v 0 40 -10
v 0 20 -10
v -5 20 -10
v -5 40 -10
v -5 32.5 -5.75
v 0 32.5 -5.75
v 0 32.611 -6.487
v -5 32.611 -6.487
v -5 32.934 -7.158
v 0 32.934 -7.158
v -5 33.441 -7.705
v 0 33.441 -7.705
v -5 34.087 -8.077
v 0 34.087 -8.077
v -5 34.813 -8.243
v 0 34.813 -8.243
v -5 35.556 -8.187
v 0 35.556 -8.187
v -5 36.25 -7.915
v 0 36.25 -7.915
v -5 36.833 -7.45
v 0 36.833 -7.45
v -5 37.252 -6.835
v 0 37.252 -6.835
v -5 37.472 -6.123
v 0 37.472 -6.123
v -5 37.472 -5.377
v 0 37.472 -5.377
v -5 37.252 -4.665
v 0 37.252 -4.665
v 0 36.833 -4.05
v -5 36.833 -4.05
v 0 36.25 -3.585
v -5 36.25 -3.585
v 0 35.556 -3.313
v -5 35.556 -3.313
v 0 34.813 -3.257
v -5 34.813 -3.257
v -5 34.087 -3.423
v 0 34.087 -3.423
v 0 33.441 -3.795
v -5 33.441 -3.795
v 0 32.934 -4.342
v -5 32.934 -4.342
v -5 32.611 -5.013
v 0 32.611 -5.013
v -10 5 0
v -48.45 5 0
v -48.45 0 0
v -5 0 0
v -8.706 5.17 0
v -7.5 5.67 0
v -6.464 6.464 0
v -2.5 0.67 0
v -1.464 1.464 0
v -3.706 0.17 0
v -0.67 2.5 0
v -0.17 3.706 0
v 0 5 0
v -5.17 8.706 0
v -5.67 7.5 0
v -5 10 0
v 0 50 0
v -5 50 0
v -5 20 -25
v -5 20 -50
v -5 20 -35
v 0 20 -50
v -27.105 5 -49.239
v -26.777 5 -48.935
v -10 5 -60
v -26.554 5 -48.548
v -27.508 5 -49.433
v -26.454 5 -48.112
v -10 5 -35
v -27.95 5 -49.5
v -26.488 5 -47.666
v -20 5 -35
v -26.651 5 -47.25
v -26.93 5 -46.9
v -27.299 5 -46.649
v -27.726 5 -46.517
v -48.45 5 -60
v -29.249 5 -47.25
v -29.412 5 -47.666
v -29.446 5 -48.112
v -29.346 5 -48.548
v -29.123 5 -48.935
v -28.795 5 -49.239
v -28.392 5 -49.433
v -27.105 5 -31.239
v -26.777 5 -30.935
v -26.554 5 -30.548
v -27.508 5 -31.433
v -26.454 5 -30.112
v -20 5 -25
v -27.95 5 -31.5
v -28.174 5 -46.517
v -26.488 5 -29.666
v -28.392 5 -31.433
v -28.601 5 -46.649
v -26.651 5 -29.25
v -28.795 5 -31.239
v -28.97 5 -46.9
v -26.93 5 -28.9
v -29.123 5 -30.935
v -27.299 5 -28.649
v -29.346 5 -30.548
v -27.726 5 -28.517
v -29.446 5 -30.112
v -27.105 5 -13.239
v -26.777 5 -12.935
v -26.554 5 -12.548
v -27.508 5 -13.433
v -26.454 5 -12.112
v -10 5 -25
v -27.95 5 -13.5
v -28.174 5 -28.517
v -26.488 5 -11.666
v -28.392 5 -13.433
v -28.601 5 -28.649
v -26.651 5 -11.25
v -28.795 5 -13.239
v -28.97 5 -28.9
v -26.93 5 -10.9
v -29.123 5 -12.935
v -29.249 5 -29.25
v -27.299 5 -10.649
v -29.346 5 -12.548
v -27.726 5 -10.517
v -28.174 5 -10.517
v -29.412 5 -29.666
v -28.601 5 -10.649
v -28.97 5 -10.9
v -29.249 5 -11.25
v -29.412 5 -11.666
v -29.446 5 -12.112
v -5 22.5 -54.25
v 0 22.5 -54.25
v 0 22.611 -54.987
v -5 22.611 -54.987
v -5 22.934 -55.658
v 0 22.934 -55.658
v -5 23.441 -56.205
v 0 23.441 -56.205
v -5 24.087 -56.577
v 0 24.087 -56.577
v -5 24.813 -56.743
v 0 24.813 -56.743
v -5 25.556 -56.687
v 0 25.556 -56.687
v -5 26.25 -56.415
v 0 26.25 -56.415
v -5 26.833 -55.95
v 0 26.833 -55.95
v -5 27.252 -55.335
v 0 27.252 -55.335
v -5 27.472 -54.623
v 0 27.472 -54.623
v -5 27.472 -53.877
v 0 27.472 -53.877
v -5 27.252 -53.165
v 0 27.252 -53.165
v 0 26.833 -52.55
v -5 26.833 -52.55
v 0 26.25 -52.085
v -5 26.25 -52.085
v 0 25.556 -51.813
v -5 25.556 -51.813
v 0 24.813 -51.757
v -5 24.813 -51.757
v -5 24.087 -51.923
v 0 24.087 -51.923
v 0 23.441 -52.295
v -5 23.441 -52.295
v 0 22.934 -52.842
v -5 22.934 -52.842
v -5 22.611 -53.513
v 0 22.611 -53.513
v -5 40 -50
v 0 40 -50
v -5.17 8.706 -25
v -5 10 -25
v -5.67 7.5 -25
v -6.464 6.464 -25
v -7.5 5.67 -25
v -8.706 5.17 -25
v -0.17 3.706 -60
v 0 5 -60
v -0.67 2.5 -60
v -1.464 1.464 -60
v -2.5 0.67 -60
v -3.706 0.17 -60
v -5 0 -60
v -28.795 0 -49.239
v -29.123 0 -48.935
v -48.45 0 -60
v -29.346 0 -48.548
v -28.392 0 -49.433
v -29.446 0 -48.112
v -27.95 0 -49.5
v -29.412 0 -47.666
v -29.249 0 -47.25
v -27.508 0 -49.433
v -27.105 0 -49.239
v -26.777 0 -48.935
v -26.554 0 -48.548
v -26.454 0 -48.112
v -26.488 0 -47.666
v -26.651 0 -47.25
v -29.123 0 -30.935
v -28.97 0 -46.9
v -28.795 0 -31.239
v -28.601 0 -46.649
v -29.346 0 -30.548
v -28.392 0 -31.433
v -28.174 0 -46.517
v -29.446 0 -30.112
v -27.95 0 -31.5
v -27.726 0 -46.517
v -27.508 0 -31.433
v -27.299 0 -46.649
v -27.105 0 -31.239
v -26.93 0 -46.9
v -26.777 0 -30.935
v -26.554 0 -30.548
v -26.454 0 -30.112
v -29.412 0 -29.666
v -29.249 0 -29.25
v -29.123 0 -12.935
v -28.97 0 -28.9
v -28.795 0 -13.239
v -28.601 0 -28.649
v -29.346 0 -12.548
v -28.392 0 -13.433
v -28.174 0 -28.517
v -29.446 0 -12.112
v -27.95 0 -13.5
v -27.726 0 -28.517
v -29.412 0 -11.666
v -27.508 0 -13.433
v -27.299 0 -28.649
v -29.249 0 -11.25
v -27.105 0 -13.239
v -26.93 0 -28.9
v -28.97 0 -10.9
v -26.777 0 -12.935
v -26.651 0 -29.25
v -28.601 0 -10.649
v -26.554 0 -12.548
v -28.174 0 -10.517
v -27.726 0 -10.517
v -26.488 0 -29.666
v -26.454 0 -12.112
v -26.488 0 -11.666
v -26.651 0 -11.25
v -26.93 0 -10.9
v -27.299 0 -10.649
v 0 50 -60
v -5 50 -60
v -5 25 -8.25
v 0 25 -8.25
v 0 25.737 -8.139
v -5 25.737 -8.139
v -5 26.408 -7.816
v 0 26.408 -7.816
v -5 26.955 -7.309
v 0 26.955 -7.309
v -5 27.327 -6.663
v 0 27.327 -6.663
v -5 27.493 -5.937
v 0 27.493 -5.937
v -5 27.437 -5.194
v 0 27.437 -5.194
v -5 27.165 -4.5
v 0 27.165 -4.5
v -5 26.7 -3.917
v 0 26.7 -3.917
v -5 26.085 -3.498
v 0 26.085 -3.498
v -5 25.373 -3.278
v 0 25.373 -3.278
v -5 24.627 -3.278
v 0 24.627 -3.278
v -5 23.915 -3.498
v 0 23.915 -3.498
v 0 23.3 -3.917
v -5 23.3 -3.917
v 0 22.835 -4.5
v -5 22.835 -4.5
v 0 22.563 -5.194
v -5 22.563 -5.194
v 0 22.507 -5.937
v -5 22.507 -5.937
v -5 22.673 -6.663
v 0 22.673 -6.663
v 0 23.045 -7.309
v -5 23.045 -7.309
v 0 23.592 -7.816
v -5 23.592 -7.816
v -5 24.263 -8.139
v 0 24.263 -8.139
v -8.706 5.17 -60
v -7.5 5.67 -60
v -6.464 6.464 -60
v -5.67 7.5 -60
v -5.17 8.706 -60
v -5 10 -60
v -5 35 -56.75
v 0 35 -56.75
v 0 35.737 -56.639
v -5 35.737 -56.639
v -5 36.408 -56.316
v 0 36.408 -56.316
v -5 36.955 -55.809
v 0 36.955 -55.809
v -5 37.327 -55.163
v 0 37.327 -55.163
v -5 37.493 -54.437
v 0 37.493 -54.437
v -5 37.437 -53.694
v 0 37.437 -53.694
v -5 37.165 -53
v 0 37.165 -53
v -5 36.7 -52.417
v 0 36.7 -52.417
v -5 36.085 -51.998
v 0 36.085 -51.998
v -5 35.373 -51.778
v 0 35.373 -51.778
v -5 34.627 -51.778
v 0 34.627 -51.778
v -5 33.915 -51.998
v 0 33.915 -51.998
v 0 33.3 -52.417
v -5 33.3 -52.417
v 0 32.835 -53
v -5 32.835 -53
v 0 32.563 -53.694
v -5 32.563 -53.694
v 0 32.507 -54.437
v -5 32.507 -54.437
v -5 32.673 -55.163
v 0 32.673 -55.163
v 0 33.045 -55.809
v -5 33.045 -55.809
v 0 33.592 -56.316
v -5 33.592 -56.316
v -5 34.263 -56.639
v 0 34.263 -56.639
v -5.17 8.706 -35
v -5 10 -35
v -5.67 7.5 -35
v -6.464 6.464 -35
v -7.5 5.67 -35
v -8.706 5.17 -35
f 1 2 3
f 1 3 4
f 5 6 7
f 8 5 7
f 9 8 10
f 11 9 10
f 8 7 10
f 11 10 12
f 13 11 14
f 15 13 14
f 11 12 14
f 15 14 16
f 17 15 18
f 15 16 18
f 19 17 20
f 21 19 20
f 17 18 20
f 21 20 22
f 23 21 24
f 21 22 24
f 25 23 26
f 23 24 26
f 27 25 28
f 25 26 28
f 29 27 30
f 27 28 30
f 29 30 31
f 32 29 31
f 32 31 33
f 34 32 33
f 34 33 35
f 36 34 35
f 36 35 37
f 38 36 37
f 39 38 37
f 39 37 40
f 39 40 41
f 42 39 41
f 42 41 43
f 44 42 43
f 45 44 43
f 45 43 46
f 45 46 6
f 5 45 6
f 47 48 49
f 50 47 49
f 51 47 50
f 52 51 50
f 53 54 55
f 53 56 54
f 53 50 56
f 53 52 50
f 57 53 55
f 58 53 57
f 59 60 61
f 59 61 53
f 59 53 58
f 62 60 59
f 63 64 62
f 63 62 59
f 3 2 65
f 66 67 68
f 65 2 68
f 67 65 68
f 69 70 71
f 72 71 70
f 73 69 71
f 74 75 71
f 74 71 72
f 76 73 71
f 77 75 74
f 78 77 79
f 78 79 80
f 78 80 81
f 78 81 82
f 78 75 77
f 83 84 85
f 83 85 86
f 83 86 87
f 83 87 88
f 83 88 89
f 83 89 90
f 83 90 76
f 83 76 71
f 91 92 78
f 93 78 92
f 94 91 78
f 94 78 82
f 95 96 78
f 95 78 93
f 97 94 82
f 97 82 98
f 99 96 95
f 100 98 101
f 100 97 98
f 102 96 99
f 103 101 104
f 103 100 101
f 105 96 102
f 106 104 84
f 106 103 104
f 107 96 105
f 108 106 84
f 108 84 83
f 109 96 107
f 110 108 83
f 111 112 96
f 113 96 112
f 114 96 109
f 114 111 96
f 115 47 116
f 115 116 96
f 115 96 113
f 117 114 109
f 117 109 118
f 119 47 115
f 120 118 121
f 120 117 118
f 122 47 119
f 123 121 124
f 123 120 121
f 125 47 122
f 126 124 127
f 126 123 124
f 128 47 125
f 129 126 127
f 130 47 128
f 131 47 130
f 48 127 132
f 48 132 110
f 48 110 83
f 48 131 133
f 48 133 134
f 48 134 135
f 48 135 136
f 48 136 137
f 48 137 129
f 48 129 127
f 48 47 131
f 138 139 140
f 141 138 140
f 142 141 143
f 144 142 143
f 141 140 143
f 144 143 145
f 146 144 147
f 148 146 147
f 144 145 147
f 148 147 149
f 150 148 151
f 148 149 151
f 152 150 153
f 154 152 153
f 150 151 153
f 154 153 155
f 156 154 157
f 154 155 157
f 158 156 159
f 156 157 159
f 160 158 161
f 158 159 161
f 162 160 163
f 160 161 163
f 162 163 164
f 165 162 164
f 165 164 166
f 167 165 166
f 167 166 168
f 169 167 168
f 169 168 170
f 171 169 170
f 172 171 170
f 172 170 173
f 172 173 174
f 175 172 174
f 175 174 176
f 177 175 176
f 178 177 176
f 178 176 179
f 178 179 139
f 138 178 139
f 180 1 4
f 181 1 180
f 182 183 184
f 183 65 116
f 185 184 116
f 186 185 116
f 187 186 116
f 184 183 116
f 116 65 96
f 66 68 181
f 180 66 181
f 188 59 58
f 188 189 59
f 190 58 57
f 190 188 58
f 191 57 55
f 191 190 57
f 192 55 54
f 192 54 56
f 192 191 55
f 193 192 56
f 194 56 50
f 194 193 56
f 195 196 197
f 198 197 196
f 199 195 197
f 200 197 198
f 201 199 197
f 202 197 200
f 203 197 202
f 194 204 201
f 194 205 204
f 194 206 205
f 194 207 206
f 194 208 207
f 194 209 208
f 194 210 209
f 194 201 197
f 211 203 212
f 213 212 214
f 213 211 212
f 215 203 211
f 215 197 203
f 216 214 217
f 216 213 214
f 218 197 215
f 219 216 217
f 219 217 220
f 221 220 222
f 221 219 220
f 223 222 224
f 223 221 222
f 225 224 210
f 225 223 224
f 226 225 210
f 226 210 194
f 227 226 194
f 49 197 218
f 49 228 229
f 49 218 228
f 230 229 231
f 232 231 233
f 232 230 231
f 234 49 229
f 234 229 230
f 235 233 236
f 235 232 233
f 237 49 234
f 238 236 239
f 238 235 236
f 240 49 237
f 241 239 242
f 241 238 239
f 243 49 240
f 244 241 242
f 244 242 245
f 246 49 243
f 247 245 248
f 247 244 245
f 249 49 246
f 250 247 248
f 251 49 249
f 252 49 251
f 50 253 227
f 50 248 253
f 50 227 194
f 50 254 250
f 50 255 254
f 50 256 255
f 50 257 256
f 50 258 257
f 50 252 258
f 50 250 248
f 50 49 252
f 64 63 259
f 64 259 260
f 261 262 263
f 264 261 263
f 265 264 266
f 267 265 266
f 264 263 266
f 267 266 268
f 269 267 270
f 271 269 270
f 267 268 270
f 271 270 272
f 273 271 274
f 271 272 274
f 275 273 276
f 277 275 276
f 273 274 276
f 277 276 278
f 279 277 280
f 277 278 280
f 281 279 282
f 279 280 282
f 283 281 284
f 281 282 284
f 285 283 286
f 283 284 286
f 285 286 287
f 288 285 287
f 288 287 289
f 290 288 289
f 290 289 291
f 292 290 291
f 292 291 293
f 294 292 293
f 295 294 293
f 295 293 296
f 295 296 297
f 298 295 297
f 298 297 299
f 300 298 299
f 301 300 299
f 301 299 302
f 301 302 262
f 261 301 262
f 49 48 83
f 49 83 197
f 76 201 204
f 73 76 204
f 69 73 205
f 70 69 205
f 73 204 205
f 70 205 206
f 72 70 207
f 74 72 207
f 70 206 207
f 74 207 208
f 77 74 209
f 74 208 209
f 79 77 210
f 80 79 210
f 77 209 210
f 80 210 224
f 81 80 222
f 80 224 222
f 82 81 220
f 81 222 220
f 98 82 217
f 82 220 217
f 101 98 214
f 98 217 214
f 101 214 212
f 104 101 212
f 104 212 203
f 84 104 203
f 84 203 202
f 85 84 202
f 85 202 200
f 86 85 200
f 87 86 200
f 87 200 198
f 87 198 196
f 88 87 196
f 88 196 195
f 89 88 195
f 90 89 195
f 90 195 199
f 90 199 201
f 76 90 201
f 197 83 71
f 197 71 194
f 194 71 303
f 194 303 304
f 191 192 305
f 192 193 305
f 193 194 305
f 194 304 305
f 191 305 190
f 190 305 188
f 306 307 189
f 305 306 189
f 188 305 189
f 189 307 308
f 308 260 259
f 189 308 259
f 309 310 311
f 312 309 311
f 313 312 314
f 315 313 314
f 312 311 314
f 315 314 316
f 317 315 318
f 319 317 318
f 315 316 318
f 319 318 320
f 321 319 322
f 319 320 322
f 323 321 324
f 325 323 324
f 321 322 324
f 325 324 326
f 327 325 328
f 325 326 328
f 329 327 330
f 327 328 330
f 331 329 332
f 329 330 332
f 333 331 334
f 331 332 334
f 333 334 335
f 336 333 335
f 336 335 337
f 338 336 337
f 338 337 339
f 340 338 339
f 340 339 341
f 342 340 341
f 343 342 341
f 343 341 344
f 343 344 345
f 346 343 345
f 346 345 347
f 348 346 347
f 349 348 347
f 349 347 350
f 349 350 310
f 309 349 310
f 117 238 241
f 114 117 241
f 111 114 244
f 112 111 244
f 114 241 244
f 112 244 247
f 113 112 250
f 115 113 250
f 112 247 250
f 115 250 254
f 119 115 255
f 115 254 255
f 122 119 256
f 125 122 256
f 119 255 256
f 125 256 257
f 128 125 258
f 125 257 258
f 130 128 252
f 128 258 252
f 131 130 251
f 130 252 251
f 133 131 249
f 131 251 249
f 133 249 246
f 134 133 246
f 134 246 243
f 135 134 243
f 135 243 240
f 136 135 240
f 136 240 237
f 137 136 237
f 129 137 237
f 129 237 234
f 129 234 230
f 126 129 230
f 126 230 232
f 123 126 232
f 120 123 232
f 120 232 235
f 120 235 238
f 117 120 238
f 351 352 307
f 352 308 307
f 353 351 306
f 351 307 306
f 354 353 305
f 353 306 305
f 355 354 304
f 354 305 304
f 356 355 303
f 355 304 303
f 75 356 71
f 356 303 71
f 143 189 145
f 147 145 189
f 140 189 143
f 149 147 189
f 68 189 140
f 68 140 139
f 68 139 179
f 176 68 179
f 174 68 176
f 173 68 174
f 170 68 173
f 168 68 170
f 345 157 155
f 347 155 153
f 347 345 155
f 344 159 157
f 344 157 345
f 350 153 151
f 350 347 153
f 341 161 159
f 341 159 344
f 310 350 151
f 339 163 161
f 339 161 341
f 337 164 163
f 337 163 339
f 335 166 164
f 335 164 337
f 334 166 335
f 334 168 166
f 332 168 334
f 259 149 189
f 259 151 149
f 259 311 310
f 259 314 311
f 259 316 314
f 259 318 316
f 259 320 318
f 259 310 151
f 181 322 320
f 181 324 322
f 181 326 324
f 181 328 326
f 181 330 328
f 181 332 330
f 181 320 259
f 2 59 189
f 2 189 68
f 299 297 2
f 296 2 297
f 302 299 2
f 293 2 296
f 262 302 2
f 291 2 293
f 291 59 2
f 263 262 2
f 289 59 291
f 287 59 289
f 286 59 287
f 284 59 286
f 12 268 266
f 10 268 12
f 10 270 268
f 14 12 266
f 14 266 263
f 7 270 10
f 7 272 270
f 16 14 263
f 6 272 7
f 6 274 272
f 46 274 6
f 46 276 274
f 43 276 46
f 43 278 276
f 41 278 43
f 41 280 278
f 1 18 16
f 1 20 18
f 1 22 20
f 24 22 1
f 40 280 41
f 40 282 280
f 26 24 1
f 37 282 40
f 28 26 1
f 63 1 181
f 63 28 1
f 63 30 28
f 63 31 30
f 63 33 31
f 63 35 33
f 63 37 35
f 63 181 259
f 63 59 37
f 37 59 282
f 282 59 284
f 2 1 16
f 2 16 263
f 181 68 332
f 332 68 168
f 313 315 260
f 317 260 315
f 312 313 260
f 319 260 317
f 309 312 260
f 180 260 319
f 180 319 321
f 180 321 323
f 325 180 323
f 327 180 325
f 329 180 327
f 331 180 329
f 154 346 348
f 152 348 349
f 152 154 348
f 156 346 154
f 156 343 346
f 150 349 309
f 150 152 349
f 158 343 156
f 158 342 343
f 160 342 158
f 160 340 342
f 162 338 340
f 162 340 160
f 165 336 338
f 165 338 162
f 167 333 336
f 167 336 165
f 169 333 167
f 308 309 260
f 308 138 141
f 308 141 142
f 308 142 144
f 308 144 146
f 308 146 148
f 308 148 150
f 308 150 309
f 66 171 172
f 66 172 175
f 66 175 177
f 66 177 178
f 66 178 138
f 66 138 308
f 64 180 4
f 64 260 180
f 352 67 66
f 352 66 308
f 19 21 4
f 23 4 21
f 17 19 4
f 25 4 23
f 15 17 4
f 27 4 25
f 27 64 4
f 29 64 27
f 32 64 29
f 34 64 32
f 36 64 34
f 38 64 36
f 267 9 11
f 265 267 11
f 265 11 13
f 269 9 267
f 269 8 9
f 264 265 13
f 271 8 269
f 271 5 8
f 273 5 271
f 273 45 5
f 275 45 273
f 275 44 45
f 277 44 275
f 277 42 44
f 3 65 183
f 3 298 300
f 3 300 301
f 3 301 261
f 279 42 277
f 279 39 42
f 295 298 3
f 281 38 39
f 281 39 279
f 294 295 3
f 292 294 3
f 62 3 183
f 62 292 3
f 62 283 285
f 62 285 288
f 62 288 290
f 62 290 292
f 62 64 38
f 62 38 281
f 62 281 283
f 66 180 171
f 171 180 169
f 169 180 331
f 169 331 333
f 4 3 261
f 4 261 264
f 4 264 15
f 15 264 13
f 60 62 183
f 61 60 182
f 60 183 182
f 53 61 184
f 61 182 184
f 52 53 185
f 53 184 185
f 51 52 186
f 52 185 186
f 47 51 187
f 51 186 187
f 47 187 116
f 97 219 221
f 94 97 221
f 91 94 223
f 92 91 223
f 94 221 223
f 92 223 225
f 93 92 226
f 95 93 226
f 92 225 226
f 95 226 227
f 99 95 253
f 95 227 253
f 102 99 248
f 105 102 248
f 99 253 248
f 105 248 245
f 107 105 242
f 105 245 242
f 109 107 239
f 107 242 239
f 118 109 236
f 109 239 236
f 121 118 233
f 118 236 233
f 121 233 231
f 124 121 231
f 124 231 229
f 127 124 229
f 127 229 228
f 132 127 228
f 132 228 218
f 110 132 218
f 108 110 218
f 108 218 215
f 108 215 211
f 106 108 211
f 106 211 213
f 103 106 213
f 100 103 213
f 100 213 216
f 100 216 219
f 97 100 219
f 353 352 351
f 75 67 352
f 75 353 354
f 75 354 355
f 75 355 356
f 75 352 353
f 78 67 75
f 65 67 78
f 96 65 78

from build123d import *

# Parameters (mm, degrees)
BOSS_EXTRUDE1_DEPTH = 60
SKETCH2_R           = 2.5
SKETCH2_W           = 40
SKETCH2_H           = 20
CUT_EXTRUDE1_DEPTH  = 10
SKETCH3_R           = 1.5
CUT_EXTRUDE2_DEPTH  = 10
RIB1_REACH          = 77.812
SKETCH4_WALL_W      = 174.836453632
SKETCH4_WALL_H      = 10
FILLET1_R           = 5


with BuildPart() as part:
    # Sketch1 → Boss-Extrude1 (new body)
    with BuildSketch(Plane.XY):
        Polygon((0, 0), (0, 50), (-5, 50), (-5, 5), (-48.45, 5), (-48.45, 0), align=None)
    extrude(amount=-BOSS_EXTRUDE1_DEPTH)

    # Sketch2 → Cut-Extrude1 (cut)
    with BuildSketch(Plane(origin=(0, 0, 0), x_dir=(0, 0, -1), z_dir=(1, 0, 0))):
        with Locations((54.25, 35)):
            Circle(SKETCH2_R)
        with Locations(Location((54.25, 25, 0), (0, 0, 270))):
            Circle(SKETCH2_R)
        with Locations((5.75, 25)):
            Circle(SKETCH2_R)
        with Locations(Location((5.75, 35, 0), (0, 0, 270))):
            Circle(SKETCH2_R)
        with Locations((30, 30)):
            Rectangle(SKETCH2_W, SKETCH2_H)
    extrude(amount=-CUT_EXTRUDE1_DEPTH, mode=Mode.SUBTRACT)

    # Sketch3 → Cut-Extrude2 (cut)
    with BuildSketch(Plane.XZ):
        with Locations(Location((-27.95, -30, 0), (0, 0, 270))):
            Circle(SKETCH3_R)
        with Locations(Location((-27.95, -12, 0), (0, 0, 270))):
            Circle(SKETCH3_R)
        with Locations(Location((-27.95, -48, 0), (0, 0, 270))):
            Circle(SKETCH3_R)
    extrude(amount=-CUT_EXTRUDE2_DEPTH, mode=Mode.SUBTRACT)

    # Sketch4 wall → Rib1 (add, up to next)
    with BuildSketch(Plane(origin=(-12.5, 12.5, -30), x_dir=(-0.707106781187, -0.707106781187, 0), z_dir=(0.707106781187, -0.707106781187, 0)), mode=Mode.PRIVATE) as rib1_sk1:
        Rectangle(SKETCH4_WALL_W, SKETCH4_WALL_H)
    rib1_tool1 = extrude(rib1_sk1.sketch, amount=RIB1_REACH, mode=Mode.PRIVATE) - part.part
    add(rib1_tool1.solids().sort_by_distance((-12.5, 12.5, -30))[0])

    # Fillet1
    fillet1_edges = [part.edges().sort_by_distance(p)[0] for p in [
        (-5, 5, -47.5),
        (0, 0, -30),
        (-5, 5, -12.5),
    ]]
    fillet(fillet1_edges, radius=FILLET1_R)


solid = part.part
